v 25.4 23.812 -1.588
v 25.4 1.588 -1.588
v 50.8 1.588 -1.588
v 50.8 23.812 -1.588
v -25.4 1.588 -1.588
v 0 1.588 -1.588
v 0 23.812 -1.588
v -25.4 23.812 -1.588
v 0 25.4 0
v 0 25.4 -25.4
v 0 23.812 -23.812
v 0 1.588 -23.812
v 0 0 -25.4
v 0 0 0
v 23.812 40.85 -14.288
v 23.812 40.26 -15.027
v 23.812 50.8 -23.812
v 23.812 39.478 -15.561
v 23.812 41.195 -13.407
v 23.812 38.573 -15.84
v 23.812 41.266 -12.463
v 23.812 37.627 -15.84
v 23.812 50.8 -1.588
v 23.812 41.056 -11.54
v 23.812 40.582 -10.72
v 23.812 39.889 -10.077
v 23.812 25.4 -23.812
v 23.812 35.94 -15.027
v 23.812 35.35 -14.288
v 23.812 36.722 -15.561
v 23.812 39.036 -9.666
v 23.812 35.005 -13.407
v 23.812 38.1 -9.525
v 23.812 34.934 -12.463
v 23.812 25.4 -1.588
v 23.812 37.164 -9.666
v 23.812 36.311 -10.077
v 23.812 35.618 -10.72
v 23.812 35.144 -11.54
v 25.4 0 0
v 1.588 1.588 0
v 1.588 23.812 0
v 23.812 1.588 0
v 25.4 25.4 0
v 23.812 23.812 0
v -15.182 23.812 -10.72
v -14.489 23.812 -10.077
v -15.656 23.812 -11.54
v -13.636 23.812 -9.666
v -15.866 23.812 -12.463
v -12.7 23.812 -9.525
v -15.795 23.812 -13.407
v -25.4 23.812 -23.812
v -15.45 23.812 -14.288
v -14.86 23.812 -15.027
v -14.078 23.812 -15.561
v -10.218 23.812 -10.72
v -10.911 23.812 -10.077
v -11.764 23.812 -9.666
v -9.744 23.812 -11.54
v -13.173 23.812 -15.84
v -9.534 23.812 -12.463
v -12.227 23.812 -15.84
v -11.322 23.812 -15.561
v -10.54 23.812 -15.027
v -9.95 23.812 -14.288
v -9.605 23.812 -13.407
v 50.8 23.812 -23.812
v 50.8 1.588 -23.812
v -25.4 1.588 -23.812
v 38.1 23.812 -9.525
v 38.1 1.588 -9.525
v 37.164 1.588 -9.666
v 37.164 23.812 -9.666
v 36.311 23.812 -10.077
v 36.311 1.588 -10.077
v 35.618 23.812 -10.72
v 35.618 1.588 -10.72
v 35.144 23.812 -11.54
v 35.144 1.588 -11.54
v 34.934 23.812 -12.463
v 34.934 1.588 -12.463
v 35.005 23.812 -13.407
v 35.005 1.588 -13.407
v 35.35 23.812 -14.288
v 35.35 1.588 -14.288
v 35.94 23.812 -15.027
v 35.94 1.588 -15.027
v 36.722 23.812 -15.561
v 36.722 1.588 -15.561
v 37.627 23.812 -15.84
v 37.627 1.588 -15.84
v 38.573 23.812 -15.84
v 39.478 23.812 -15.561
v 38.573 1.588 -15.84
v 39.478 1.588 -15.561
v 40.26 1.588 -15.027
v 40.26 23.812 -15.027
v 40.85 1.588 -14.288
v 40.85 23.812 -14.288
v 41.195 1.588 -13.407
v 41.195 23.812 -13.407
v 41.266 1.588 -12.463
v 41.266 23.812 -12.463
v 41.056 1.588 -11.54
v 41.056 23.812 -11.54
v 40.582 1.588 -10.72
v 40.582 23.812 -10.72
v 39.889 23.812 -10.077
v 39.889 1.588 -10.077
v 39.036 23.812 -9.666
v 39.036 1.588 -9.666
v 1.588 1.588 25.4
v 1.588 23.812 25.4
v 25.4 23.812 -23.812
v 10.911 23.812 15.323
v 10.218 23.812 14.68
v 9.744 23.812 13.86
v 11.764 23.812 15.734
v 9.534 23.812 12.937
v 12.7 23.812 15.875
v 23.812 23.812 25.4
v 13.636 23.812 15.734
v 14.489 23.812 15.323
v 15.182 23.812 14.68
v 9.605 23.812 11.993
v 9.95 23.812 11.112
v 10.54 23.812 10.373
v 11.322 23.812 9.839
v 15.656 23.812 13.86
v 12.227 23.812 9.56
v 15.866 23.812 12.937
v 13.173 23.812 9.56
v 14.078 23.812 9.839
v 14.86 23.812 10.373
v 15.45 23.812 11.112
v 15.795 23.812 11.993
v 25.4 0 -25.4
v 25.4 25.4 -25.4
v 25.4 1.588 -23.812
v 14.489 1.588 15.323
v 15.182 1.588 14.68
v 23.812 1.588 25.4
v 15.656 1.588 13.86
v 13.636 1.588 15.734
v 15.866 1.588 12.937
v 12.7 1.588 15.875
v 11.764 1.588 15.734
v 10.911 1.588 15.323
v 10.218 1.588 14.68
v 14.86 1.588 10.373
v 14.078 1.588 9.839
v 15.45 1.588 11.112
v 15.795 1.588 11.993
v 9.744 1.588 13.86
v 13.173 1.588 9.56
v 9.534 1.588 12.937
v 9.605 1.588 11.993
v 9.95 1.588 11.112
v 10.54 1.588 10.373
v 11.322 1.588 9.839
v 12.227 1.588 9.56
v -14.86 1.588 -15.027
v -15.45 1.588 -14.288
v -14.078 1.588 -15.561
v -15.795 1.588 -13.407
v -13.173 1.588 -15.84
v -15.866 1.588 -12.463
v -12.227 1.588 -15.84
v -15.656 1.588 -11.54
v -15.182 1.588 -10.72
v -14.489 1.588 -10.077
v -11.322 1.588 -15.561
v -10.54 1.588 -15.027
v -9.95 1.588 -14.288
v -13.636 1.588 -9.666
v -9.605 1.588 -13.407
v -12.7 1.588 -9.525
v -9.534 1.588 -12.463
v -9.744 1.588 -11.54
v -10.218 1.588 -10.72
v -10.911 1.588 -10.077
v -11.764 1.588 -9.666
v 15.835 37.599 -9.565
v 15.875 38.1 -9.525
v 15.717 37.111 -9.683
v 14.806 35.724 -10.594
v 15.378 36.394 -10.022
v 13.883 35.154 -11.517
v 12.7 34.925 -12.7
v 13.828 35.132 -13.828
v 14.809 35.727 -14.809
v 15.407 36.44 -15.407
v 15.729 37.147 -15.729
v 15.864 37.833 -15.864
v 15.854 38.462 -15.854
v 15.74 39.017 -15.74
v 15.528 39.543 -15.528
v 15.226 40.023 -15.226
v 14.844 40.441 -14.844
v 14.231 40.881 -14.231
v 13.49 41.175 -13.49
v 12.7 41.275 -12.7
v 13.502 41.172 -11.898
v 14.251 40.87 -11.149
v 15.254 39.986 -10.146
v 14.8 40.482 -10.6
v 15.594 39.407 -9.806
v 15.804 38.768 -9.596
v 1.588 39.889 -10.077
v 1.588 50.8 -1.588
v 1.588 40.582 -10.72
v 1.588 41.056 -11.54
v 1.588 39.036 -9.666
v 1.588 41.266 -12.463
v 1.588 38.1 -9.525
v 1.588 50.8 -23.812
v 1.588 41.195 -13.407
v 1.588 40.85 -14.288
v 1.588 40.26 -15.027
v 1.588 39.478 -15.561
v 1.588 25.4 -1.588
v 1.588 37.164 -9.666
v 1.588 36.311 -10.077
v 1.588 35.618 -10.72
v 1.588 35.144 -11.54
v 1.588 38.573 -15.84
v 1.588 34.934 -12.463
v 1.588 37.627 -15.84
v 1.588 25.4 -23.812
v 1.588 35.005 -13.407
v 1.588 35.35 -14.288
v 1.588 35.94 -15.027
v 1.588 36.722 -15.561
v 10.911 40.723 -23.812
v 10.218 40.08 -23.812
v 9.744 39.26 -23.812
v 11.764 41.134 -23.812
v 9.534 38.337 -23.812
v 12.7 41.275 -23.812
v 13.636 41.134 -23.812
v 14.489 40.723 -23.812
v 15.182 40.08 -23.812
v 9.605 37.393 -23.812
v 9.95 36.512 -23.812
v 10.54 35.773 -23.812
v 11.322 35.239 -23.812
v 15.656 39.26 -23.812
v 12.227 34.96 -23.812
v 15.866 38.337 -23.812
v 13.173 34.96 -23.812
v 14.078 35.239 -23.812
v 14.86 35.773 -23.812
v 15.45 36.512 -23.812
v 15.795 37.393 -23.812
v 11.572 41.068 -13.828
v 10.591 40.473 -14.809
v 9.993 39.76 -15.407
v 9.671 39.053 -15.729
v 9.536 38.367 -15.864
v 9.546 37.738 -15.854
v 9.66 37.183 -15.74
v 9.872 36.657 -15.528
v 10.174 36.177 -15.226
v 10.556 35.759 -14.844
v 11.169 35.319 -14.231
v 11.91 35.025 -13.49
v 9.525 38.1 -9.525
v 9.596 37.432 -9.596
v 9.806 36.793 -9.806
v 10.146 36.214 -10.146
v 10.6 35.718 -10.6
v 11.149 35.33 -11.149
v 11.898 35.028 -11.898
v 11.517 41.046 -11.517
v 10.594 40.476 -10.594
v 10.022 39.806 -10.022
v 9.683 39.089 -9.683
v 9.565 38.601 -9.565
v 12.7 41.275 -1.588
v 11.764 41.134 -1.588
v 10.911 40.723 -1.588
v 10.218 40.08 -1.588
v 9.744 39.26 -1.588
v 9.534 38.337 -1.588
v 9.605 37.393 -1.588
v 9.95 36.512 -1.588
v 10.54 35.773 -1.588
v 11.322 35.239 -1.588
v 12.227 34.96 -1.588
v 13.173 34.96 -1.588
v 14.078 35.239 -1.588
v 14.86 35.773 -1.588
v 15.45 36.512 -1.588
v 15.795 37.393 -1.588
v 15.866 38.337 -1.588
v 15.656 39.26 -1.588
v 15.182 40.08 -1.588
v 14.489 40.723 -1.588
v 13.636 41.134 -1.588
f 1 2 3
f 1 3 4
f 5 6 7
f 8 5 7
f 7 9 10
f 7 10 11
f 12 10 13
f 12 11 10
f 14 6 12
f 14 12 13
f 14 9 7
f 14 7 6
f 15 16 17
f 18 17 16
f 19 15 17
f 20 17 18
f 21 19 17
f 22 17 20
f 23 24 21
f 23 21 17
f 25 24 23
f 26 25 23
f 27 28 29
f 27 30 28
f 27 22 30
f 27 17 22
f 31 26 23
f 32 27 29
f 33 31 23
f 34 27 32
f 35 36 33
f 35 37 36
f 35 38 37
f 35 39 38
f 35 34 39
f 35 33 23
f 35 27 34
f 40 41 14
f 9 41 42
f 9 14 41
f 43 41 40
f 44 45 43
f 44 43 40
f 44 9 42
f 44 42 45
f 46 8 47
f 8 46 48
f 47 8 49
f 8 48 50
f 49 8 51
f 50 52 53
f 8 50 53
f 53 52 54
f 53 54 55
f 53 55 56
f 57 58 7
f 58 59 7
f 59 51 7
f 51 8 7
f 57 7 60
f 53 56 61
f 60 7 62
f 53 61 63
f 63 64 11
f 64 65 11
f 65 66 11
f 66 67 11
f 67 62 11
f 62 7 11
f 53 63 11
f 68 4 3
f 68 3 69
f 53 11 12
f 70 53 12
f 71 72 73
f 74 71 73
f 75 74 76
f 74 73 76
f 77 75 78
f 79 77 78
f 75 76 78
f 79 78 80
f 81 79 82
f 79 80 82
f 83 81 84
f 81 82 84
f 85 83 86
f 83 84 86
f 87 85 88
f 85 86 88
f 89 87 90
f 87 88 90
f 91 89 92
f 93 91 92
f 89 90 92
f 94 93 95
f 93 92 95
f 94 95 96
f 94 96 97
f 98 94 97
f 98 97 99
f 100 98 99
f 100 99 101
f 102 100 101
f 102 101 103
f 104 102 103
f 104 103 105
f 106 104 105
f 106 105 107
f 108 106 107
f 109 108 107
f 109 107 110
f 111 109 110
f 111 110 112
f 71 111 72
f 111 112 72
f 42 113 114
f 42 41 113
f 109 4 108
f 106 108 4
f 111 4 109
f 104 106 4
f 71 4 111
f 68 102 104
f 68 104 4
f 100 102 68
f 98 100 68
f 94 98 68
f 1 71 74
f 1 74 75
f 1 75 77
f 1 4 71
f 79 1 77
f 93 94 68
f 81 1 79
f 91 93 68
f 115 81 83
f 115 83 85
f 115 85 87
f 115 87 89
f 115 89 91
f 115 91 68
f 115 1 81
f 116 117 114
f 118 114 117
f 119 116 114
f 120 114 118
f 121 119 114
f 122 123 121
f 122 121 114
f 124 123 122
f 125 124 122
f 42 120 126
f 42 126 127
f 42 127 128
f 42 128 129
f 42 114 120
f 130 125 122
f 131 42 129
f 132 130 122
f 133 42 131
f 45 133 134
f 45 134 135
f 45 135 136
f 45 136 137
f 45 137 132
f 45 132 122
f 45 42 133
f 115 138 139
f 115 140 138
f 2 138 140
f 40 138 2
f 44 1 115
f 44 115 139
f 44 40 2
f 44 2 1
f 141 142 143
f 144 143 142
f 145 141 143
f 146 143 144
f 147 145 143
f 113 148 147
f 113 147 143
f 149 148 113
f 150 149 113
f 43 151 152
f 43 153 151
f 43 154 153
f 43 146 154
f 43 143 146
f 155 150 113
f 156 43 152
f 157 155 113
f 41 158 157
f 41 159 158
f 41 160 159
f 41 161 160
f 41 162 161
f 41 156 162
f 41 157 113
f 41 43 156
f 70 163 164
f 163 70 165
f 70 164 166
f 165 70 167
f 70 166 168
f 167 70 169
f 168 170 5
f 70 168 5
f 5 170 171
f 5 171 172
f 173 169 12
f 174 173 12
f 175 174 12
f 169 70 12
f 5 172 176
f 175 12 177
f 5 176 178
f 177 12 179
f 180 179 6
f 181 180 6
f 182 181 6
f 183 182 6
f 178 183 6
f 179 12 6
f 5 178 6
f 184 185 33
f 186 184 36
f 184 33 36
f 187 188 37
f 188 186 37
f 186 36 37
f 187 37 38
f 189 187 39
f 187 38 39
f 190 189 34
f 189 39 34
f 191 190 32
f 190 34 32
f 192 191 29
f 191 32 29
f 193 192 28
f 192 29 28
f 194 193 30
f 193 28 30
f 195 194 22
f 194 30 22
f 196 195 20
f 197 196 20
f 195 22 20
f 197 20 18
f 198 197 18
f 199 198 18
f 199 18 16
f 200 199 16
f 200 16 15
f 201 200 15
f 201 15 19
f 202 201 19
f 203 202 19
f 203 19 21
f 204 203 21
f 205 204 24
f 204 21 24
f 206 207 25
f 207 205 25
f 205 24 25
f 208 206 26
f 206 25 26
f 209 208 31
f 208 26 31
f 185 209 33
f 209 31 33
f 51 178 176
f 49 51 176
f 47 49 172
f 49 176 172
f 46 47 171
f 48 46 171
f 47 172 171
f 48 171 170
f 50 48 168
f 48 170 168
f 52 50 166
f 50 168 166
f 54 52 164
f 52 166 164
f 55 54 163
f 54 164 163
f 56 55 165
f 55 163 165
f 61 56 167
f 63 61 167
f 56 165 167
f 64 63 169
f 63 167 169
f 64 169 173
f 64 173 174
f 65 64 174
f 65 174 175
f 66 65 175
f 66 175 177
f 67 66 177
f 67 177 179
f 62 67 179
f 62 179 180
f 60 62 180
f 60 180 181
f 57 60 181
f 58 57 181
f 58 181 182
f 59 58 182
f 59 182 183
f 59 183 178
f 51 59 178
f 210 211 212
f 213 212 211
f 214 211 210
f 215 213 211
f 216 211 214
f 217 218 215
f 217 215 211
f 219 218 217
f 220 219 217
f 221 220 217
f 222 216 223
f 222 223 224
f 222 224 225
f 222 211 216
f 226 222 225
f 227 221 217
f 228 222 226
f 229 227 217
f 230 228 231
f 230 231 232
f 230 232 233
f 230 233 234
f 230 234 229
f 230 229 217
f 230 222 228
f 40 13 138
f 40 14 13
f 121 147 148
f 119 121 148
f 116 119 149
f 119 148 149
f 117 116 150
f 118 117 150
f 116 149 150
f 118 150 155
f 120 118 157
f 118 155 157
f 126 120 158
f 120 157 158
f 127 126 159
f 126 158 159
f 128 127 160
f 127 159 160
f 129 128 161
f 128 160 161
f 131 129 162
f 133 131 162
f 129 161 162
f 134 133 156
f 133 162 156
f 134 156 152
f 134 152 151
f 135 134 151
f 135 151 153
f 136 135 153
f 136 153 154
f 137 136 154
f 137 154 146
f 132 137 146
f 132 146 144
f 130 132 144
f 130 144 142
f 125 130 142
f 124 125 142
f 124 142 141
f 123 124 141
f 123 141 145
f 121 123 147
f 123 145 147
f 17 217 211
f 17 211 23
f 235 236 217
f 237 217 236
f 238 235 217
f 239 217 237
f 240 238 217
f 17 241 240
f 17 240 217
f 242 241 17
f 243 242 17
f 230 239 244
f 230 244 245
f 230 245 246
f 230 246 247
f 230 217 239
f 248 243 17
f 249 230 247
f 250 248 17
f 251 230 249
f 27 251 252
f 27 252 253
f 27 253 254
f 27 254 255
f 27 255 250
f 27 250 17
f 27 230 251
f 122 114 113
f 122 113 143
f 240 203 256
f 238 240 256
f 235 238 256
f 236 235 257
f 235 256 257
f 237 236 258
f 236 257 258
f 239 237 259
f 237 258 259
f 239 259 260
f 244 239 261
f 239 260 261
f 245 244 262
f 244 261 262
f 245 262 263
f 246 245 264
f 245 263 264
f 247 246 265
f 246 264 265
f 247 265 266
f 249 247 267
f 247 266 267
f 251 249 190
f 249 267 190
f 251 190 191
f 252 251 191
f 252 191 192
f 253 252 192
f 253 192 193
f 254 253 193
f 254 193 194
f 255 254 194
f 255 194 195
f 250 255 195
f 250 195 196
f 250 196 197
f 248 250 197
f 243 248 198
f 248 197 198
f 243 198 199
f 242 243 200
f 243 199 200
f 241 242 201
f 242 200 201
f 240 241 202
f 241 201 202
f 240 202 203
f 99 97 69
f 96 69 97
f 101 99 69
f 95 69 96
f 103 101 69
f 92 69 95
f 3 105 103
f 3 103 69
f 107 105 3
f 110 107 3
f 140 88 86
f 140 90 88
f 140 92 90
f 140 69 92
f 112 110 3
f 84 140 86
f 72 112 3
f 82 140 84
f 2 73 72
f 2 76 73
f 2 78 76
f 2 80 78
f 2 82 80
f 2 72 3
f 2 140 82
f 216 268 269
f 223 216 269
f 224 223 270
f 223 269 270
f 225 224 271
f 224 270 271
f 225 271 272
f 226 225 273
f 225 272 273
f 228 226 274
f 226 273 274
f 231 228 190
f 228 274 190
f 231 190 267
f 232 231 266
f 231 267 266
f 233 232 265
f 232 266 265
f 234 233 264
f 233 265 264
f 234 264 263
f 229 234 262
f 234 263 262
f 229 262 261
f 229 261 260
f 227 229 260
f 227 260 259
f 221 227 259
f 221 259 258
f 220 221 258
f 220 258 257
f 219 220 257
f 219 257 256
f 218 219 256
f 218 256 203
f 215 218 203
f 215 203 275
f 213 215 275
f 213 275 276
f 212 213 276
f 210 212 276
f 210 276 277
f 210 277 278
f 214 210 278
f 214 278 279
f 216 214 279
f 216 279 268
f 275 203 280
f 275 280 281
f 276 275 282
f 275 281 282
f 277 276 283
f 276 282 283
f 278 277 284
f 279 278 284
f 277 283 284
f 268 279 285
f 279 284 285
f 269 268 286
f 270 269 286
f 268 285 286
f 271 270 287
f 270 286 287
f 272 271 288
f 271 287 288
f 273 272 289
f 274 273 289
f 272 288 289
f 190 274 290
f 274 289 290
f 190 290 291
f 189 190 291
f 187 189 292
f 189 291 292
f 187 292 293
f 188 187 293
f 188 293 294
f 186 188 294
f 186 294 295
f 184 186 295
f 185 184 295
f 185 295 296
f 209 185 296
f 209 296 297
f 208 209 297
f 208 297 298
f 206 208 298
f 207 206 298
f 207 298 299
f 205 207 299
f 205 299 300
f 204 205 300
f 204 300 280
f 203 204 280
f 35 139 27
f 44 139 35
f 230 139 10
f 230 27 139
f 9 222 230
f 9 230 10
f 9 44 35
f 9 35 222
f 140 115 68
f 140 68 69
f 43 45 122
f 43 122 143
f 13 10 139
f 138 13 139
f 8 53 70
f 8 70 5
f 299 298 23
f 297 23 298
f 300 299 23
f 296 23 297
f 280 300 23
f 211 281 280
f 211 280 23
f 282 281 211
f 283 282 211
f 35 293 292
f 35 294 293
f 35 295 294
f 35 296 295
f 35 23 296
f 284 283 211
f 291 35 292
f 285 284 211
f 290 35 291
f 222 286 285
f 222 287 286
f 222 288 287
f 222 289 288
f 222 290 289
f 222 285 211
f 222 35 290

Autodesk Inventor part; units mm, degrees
ref_plane "YZ Plane" through (0, 0, 0) normal (1, 0, 0) x (0, 1, 0)
ref_plane "XZ Plane" through (0, 0, 0) normal (0, 1, 0) x (-1, 0, 0)
ref_plane "XY Plane" through (0, 0, 0) normal (0, 0, 1) x (1, 0, 0)
sketch "Sketch1" plane through (0, 0, 0) normal (0, 0, 1) x (1, 0, 0)
  line L0 (0, 0) -> (25.4, 0)
  line L1 (25.4, 0) -> (25.4, 25.4)
  line L2 (25.4, 25.4) -> (0, 25.4)
  line L3 (0, 25.4) -> (0, 0)
  line L4 (1.5875, 23.8125) -> (23.8125, 23.8125)
  line L5 (23.8125, 23.8125) -> (23.8125, 1.5875)
  line L6 (23.8125, 1.5875) -> (1.5875, 1.5875)
  line L7 (1.5875, 1.5875) -> (1.5875, 23.8125)
  dimension "d0" = 25.4
  dimension "d1" = 25.4
  dimension "d4" = 1.5875
extrude "Extrusion1" add sketch "Sketch1" against normal blind 25.4 contours L3 L2 L1 L0 | L4 L5 L6 L7
extrude "Extrusion2" add sketch "Sketch1" along normal blind 25.4 contours L4 L5 L6 L7
sketch "Sketch2" plane through (25.4, 0, 0) normal (1, 0, 0) x (0, 0, -1)
  line L0 (25.4, 0) -> (25.4, 25.4) projected
  line L1 (0, 25.4) -> (25.4, 25.4) projected
  line L2 (0, 0) -> (0, 25.4) projected
  line L3 (0, 0) -> (25.4, 0) projected
  line L4 (23.8125, 23.8125) -> (23.8125, 1.5875)
  line L5 (23.8125, 1.5875) -> (1.5875, 1.5875)
  line L6 (1.5875, 1.5875) -> (1.5875, 23.8125)
  line L7 (1.5875, 23.8125) -> (23.8125, 23.8125)
  dimension "d8" = 1.5875
sketch "Sketch3" plane through (0, 25.4, 0) normal (0, 1, 0) x (1, 0, 0)
  line L0 (25.4, 25.4) -> (0, 25.4) projected
  line L1 (0, 0) -> (0, 25.4) projected
  line L2 (25.4, 0) -> (0, 0) projected
  line L3 (25.4, 0) -> (25.4, 25.4) projected
  line L4 (1.5875, 23.8125) -> (23.8125, 23.8125)
  line L5 (23.8125, 23.8125) -> (23.8125, 1.5875)
  line L6 (23.8125, 1.5875) -> (1.5875, 1.5875)
  line L7 (1.5875, 1.5875) -> (1.5875, 23.8125)
  dimension "d9" = 1.5875
extrude "Extrusion3" add sketch "Sketch2" along normal blind 25.4 contours L4 L5 L6 L7
extrude "Extrusion4" add sketch "Sketch3" along normal blind 25.4 contours L4 L5 L6 L7
sketch "Sketch4" plane through (0, 0, 0) normal (-1, 0, 0) x (0, 0, 1)
  line L0 (-25.4, 25.4) -> (-25.4, 0) projected
  line L1 (0, 0) -> (-25.4, 0) projected
  line L2 (0, 25.4) -> (0, 0) projected
  line L3 (0, 25.4) -> (-25.4, 25.4) projected
  line L4 (-23.8125, 23.8125) -> (-23.8125, 1.5875)
  line L5 (-23.8125, 1.5875) -> (-1.5875, 1.5875)
  line L6 (-1.5875, 1.5875) -> (-1.5875, 23.8125)
  line L7 (-1.5875, 23.8125) -> (-23.8125, 23.8125)
  dimension "d15" = 1.5875
extrude "Extrusion5" add sketch "Sketch4" along normal blind 25.4 contours L7 L6 L5 L4
sketch "Sketch6" plane through (0, 23.8125, -1.5875) normal (0, 1, 0) x (1, 0, 0)
  line L0 (-25.4, 22.225) -> (-25.4, 0) projected
  line L1 (0, 22.225) -> (0, 0) projected
  line L2 (0, 22.225) -> (-25.4, 22.225) projected
  line L3 (25.4, -1.5875) -> (0, -1.5875) projected
  point P0 (-12.7, 11.1125)
  point P1 (12.7, -14.2875)
  point P2 (38.1, 11.1125)
  dimension "d21" = 12.7
  dimension "d22" = 50.8
  dimension "d23" = 11.1125
  dimension "d24" = 12.7
  dimension "d25" = 12.7
hole "Hole1" at (-12.7, 23.8125, -12.7) at (12.7, 23.8125, 12.7) at (38.1, 23.8125, -12.7) direction (0, -1, 0) diameter 6.35 depth 25.4 tip angle 118
sketch "Sketch7" plane through (23.8125, 25.4, -23.8125) normal (0, 0, -1) x (-1, 0, 0)
  point P0 (23.8125, -25.4)
  point P1 (11.1125, 12.7)
hole "Hole2" at (12.7, 38.1, -23.8125) direction (0, 0, 1) diameter 6.35 depth 25.4 tip angle 118
sketch "Sketch8" plane through (1.5875, 25.4, -23.8125) normal (-1, 0, 0) x (0, 0, 1)
  point P0 (23.8125, -25.4)
  point P1 (11.1125, 12.7)
hole "Hole3" at (1.5875, 38.1, -12.7) direction (1, 0, 0) diameter 6.35 depth 25.4 tip angle 118
properties part number "4-way corner"
